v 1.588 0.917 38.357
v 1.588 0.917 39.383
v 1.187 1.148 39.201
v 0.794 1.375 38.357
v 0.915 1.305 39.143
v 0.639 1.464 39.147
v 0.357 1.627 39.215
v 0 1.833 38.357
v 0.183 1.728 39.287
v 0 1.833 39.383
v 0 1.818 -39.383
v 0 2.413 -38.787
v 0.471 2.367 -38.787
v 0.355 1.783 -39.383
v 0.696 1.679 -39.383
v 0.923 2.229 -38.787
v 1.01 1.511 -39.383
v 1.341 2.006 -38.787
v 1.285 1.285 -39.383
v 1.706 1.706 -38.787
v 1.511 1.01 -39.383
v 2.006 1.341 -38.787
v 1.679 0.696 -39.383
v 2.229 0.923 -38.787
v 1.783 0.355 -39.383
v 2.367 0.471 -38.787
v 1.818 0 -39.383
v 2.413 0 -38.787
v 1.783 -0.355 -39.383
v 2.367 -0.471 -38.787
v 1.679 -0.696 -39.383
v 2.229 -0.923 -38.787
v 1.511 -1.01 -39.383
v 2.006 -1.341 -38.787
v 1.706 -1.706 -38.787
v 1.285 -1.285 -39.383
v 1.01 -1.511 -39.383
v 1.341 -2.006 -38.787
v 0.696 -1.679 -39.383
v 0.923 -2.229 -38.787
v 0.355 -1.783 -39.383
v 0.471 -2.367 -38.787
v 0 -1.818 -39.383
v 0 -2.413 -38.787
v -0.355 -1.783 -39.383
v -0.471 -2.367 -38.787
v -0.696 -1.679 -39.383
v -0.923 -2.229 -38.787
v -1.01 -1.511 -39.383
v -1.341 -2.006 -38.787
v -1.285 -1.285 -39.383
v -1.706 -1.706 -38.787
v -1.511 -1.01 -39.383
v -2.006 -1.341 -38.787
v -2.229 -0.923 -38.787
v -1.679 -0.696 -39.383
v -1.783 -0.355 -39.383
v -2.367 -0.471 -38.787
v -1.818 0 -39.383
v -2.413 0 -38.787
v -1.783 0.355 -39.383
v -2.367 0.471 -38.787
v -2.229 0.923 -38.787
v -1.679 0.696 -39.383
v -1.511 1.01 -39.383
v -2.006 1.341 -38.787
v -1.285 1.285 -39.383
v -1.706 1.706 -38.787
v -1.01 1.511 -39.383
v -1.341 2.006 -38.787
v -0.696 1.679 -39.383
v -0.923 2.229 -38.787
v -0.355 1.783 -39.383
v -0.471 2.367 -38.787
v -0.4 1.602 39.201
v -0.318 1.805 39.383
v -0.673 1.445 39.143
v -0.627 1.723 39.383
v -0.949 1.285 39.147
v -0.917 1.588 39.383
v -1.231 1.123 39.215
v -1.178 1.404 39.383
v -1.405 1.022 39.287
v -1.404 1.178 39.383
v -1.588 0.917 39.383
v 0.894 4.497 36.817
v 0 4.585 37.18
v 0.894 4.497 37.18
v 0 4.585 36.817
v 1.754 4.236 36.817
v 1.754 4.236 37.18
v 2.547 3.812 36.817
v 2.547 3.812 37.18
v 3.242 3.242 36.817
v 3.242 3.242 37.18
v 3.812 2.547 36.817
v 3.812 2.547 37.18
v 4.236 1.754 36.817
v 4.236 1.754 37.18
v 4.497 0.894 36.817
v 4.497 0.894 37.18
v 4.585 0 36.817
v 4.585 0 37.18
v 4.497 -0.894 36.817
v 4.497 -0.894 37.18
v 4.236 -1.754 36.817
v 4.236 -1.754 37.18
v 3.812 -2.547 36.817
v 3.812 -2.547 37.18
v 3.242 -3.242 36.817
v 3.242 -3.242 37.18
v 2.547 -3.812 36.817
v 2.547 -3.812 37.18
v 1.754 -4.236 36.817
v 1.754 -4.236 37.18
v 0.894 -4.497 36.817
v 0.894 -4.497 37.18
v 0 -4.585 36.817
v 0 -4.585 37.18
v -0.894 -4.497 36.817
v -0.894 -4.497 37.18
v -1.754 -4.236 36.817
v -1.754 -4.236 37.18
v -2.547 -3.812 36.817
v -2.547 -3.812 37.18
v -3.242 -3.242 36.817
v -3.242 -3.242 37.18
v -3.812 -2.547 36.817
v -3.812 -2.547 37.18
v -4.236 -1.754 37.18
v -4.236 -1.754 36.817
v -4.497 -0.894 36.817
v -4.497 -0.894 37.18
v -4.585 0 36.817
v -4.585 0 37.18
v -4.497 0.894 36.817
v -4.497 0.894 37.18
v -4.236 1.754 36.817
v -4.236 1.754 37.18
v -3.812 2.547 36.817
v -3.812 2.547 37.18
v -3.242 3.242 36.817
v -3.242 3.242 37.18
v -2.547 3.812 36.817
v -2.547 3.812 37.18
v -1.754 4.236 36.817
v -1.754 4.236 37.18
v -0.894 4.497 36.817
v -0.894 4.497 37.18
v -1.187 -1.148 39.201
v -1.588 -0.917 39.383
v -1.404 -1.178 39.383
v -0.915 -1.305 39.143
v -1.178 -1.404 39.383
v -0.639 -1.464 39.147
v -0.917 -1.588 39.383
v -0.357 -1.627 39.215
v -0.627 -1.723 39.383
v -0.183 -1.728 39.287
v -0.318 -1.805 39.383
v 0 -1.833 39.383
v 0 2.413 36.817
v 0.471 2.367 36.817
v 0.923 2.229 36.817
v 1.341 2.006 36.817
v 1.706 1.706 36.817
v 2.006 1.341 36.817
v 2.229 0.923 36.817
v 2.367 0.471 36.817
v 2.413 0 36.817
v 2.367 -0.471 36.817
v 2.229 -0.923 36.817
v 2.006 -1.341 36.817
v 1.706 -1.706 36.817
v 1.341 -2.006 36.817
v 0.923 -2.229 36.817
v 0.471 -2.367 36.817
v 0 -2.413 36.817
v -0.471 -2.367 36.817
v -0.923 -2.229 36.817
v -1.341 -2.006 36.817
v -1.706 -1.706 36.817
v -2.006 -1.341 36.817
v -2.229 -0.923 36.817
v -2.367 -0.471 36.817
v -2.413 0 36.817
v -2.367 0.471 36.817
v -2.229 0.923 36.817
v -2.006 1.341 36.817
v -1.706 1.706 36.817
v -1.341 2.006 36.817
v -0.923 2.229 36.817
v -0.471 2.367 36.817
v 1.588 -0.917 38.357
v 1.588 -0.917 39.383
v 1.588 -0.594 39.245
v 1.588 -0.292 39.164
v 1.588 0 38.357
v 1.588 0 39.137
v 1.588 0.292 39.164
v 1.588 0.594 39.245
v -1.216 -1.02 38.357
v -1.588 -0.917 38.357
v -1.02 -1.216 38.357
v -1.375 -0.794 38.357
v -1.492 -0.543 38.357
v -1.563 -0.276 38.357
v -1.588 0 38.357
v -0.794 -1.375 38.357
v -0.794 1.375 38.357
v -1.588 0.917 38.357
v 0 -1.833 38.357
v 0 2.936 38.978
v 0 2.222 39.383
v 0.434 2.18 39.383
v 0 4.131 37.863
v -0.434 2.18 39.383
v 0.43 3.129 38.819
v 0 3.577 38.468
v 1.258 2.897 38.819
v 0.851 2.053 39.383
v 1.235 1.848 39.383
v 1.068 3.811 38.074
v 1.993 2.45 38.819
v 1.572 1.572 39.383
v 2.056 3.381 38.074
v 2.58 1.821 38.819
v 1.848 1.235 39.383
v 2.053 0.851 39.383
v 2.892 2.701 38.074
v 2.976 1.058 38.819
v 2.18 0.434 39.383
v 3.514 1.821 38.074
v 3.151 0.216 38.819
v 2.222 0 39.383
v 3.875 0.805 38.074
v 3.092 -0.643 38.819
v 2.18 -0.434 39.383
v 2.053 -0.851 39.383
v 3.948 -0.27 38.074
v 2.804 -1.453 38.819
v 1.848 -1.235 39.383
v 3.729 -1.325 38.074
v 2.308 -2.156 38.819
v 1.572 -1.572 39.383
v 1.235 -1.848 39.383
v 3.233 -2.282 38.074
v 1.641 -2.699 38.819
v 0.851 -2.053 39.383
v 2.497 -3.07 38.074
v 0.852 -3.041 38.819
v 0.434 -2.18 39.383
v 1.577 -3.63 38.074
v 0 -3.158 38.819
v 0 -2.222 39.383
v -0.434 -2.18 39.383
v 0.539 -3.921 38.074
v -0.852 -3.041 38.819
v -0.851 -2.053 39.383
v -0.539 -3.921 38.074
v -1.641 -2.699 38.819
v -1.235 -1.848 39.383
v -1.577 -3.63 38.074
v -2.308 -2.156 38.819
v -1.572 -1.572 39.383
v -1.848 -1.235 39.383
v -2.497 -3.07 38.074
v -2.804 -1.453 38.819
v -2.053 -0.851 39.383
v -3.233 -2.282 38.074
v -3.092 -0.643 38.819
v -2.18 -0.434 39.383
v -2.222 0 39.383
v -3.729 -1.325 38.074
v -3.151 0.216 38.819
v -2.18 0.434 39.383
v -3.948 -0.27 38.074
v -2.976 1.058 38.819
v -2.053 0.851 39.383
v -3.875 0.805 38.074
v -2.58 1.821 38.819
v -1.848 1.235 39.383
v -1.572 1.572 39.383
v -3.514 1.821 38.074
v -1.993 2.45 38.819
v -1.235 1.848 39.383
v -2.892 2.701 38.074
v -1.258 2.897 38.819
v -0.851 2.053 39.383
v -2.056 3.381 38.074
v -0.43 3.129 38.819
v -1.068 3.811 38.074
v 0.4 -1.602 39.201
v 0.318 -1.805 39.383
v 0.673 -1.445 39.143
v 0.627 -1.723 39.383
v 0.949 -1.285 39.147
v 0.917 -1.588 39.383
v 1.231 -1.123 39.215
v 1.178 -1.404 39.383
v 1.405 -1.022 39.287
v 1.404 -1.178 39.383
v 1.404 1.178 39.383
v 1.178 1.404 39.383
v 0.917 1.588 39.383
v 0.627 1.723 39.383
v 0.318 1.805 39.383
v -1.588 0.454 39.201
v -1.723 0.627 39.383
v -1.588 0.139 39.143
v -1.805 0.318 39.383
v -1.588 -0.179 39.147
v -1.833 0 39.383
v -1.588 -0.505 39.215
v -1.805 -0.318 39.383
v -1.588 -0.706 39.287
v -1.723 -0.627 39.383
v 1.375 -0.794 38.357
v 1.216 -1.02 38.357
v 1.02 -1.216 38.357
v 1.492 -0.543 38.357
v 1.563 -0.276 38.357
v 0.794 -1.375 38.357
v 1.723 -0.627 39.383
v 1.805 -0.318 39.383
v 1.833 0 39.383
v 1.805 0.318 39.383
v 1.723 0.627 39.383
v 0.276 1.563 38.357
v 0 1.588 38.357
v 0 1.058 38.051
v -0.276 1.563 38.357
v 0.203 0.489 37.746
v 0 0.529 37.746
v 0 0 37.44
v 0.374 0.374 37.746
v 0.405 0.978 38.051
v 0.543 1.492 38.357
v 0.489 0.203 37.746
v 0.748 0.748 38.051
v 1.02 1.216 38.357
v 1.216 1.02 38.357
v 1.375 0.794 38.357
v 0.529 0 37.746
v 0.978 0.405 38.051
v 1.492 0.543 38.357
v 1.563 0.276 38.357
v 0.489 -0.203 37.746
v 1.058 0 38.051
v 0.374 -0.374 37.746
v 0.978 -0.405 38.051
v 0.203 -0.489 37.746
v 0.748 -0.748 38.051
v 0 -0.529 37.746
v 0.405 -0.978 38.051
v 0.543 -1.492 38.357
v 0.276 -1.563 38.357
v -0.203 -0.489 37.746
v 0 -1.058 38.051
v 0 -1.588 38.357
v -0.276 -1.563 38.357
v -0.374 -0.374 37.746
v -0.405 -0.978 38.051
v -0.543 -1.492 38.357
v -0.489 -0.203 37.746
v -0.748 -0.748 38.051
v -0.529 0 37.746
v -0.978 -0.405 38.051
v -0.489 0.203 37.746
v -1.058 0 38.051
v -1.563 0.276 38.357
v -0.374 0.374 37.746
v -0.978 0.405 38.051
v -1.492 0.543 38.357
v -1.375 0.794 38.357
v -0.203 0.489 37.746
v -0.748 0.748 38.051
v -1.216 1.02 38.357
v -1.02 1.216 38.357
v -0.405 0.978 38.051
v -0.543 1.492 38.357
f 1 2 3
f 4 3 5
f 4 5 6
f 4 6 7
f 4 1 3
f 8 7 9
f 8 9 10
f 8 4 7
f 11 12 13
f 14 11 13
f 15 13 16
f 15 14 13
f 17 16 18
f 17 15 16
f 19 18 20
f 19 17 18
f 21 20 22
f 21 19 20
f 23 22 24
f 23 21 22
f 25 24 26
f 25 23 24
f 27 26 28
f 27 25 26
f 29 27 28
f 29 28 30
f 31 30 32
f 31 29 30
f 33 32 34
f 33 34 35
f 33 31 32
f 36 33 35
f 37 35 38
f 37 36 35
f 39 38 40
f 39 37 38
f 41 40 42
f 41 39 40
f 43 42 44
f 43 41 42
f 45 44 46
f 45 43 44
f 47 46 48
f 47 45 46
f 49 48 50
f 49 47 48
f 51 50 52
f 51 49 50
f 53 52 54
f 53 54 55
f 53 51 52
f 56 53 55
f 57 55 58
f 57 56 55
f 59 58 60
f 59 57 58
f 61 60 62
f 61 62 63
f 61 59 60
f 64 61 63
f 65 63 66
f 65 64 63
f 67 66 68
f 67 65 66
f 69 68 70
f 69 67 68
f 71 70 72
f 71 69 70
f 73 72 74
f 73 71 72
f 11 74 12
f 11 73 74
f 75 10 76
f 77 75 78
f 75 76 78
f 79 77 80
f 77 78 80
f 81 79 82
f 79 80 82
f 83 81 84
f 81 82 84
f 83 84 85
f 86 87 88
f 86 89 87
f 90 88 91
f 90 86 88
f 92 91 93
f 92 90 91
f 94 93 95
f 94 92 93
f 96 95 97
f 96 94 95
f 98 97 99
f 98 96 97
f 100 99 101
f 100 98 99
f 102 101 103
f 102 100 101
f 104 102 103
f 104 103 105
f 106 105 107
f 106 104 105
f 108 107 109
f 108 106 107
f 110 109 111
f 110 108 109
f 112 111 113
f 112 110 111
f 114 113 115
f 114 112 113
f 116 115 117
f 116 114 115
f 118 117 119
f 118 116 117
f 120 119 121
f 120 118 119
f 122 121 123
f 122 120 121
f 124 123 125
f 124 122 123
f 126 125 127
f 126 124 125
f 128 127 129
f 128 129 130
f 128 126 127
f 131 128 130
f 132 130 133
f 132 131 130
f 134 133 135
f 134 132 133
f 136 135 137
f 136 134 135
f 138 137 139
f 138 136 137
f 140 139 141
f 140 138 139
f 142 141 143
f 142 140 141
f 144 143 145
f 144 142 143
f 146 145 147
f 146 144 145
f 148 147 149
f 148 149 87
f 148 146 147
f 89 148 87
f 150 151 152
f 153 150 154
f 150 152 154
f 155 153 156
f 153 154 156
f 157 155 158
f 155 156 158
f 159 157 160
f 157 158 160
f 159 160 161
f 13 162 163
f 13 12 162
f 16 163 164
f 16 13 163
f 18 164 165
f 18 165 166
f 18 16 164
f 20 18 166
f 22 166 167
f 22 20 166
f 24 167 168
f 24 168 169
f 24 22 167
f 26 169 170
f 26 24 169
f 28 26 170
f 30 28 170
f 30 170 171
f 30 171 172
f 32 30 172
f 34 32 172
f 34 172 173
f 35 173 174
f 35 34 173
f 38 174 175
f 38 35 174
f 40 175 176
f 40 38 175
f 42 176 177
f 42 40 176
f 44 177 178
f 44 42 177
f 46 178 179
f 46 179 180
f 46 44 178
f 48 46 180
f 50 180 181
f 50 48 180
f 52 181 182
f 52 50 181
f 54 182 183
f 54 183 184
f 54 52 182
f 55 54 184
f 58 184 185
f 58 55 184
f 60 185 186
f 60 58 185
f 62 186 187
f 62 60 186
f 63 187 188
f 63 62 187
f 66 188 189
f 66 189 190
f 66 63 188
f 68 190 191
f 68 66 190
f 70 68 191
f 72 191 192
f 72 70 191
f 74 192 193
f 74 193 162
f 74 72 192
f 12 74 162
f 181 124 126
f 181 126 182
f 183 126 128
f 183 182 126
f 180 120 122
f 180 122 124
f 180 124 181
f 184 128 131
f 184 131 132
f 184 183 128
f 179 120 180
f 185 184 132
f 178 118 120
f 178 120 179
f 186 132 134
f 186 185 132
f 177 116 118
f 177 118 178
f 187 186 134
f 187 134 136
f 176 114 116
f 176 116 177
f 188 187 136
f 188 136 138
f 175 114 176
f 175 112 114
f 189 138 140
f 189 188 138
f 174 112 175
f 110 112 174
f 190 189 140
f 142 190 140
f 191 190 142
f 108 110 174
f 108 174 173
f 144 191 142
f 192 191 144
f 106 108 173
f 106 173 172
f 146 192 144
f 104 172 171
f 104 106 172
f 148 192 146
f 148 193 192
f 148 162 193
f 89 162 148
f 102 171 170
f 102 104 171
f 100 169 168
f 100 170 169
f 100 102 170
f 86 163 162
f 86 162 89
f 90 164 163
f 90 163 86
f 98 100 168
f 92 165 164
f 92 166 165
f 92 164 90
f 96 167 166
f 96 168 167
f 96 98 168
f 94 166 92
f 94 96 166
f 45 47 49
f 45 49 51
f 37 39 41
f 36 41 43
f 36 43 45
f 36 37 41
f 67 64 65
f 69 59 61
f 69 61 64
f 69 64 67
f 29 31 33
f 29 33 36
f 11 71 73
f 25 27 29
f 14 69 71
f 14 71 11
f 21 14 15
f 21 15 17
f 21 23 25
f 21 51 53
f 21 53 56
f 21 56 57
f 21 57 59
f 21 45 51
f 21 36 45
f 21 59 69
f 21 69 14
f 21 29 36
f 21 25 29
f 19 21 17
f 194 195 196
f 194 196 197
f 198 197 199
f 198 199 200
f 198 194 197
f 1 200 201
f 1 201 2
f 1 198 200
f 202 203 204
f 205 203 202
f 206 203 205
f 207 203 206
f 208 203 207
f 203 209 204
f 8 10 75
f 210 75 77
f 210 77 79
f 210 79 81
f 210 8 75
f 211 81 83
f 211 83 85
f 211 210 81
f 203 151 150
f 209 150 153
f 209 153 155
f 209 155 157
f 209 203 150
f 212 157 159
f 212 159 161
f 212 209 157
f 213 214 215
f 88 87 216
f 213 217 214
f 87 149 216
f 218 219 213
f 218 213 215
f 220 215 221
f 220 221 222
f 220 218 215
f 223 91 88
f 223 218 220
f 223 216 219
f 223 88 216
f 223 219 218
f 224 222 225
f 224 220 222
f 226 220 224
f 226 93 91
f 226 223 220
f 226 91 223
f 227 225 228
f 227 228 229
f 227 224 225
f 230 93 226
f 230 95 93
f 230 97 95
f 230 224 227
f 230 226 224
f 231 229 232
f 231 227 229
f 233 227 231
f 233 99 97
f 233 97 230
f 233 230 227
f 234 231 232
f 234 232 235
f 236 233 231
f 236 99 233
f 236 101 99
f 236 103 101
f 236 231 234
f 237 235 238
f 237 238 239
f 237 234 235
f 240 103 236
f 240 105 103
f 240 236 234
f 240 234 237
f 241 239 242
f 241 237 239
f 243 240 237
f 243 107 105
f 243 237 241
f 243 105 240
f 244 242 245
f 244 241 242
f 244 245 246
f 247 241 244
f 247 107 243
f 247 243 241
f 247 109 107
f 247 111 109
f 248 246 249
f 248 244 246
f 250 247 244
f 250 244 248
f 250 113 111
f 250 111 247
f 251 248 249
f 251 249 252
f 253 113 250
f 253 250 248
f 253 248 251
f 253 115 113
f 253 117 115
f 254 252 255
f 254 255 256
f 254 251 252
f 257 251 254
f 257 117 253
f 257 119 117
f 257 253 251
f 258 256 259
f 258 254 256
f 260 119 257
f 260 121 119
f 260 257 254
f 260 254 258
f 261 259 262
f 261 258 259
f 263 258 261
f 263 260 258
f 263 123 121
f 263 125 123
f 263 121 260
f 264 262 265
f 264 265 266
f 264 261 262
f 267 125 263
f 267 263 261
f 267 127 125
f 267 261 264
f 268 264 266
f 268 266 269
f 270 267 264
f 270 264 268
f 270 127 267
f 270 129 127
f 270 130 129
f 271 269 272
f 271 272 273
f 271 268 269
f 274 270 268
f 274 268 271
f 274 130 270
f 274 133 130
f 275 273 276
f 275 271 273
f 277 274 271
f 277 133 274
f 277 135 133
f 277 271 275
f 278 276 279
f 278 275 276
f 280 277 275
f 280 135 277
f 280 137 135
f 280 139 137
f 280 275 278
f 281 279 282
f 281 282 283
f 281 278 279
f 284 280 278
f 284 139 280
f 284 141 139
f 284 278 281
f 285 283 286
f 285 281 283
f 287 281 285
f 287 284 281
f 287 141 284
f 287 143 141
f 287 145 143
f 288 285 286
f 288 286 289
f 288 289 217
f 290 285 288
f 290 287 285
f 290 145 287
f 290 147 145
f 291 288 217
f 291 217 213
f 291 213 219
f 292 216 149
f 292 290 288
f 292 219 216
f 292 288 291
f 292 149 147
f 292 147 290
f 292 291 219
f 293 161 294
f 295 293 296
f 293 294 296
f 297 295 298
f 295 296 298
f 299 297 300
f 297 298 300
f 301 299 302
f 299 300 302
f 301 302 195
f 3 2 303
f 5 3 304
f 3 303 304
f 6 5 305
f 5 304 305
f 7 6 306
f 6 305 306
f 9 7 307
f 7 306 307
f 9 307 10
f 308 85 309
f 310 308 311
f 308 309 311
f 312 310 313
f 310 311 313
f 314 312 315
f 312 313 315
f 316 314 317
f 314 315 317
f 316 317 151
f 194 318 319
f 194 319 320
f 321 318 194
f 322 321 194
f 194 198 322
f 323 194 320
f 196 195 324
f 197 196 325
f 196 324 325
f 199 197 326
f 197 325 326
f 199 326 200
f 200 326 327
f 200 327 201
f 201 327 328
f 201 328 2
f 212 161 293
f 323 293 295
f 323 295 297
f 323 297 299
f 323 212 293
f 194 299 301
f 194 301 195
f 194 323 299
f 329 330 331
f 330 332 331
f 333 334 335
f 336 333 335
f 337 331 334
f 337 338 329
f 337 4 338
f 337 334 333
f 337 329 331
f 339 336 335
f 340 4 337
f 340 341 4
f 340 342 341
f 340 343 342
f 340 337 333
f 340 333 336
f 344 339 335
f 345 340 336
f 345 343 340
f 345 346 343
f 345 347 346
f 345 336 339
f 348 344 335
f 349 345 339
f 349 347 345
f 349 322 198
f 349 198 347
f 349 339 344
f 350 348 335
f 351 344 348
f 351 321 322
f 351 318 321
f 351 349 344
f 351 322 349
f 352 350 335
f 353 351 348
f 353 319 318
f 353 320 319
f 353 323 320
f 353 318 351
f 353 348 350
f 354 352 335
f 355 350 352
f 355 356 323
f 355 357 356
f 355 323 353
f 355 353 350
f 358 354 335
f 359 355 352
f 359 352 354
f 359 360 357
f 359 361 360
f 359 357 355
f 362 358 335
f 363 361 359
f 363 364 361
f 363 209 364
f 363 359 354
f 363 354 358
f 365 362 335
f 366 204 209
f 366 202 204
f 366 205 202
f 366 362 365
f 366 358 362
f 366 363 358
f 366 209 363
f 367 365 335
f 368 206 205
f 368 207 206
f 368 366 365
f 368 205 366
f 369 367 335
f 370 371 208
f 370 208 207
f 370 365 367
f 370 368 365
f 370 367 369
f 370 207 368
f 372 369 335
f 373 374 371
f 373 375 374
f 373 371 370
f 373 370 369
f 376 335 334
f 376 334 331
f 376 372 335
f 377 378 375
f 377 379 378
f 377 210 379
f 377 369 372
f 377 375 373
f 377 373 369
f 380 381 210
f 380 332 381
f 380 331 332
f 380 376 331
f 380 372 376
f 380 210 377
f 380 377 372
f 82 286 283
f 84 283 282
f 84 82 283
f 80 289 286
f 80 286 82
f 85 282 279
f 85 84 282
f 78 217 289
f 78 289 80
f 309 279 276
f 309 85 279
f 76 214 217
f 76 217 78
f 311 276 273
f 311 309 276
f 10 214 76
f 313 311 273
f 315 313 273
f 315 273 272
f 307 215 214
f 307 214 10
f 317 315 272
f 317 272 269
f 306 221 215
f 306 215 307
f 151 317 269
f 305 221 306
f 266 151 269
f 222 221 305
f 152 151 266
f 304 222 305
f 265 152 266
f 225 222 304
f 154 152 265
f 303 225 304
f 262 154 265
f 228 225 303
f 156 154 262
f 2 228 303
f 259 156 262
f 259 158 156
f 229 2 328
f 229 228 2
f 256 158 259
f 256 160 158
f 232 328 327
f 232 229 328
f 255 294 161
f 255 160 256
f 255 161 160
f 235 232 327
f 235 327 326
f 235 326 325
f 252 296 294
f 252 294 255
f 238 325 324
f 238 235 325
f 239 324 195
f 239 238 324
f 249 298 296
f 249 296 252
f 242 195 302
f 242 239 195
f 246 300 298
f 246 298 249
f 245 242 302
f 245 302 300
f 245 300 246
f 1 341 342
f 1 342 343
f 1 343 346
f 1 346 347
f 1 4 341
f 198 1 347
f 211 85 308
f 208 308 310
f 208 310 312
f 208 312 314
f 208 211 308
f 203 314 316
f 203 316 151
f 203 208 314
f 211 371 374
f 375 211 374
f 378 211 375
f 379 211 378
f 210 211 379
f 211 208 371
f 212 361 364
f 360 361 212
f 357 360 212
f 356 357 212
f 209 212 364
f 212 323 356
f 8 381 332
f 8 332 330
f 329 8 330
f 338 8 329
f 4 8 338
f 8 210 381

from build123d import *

# Parameters (mm, degrees)
CUT_EXTRUDE1_START = 38.35654
CUT_EXTRUDE1_DEPTH = 2.02616
SKETCH4_R          = 1.833087105
CUT_EXTRUDE2_DEPTH = 1.02616
CUT_EXTRUDE2_DRAFT = -45


with BuildPart() as part:
    # Sketch2 → Revolve1 (revolve)
    with BuildSketch(Plane(origin=(0, 0, 0), x_dir=(0, 0, -1), z_dir=(1, 0, 0))):
        with BuildLine():
            Line((-39.3827, 1.5875), (-39.3827, 2.2225))
            ThreePointArc((-39.3827, 2.2225), (-38.467752118, 3.57733025), (-37.180157143, 4.5847))
            Line((-37.180157143, 4.5847), (-36.8173, 4.5847))
            Line((-36.8173, 4.5847), (-36.8173, 2.413))
            Line((-36.8173, 2.413), (38.7873875, 2.413))
            Line((38.7873875, 2.413), (39.3827, 1.8176875))
            Line((39.3827, 1.8176875), (39.3827, 0))
            Line((39.3827, 0), (-37.439996448, 0))
            Line((-37.439996448, 0), (-38.35654, 1.5875))
            Line((-38.35654, 1.5875), (-39.3827, 1.5875))
        make_face()
    revolve(axis=Axis((0, 0, 39.3827), (0, 0, -1)))

    # Sketch3 → Cut-Extrude1 (cut, through all)
    with BuildSketch(Plane.XY.offset(CUT_EXTRUDE1_START)):
        Polygon((0, 1.833087105), (-1.5875, 0.916543552), (-1.5875, -0.916543552), (0, -1.833087105), (1.5875, -0.916543552), (1.5875, 0.916543552), align=None)
    extrude(amount=CUT_EXTRUDE1_DEPTH, mode=Mode.SUBTRACT)


with BuildPart() as cut_extrude2_tool:
    # Sketch4 → Cut-Extrude2 (with draft: the straight prism first)
    with BuildSketch(Plane.XY.offset(39.3827)):
        Circle(SKETCH4_R)
    extrude(amount=-CUT_EXTRUDE2_DEPTH)
    # Cut-Extrude2: the draft: its side faces are tilted about the plane it starts from
    cut_extrude2_sides = [cut_extrude2_tool.faces().sort_by_distance(p)[0] for p in [
        (-1.833087105, 0, 38.86962),
    ]]
    draft(cut_extrude2_sides, Plane.XY.offset(39.3827), CUT_EXTRUDE2_DRAFT)


with BuildPart() as part_1:
    add(part.part)

    # Cut-Extrude2: cut by cut_extrude2_tool
    add(cut_extrude2_tool.part, mode=Mode.SUBTRACT)


solid = part_1.part
